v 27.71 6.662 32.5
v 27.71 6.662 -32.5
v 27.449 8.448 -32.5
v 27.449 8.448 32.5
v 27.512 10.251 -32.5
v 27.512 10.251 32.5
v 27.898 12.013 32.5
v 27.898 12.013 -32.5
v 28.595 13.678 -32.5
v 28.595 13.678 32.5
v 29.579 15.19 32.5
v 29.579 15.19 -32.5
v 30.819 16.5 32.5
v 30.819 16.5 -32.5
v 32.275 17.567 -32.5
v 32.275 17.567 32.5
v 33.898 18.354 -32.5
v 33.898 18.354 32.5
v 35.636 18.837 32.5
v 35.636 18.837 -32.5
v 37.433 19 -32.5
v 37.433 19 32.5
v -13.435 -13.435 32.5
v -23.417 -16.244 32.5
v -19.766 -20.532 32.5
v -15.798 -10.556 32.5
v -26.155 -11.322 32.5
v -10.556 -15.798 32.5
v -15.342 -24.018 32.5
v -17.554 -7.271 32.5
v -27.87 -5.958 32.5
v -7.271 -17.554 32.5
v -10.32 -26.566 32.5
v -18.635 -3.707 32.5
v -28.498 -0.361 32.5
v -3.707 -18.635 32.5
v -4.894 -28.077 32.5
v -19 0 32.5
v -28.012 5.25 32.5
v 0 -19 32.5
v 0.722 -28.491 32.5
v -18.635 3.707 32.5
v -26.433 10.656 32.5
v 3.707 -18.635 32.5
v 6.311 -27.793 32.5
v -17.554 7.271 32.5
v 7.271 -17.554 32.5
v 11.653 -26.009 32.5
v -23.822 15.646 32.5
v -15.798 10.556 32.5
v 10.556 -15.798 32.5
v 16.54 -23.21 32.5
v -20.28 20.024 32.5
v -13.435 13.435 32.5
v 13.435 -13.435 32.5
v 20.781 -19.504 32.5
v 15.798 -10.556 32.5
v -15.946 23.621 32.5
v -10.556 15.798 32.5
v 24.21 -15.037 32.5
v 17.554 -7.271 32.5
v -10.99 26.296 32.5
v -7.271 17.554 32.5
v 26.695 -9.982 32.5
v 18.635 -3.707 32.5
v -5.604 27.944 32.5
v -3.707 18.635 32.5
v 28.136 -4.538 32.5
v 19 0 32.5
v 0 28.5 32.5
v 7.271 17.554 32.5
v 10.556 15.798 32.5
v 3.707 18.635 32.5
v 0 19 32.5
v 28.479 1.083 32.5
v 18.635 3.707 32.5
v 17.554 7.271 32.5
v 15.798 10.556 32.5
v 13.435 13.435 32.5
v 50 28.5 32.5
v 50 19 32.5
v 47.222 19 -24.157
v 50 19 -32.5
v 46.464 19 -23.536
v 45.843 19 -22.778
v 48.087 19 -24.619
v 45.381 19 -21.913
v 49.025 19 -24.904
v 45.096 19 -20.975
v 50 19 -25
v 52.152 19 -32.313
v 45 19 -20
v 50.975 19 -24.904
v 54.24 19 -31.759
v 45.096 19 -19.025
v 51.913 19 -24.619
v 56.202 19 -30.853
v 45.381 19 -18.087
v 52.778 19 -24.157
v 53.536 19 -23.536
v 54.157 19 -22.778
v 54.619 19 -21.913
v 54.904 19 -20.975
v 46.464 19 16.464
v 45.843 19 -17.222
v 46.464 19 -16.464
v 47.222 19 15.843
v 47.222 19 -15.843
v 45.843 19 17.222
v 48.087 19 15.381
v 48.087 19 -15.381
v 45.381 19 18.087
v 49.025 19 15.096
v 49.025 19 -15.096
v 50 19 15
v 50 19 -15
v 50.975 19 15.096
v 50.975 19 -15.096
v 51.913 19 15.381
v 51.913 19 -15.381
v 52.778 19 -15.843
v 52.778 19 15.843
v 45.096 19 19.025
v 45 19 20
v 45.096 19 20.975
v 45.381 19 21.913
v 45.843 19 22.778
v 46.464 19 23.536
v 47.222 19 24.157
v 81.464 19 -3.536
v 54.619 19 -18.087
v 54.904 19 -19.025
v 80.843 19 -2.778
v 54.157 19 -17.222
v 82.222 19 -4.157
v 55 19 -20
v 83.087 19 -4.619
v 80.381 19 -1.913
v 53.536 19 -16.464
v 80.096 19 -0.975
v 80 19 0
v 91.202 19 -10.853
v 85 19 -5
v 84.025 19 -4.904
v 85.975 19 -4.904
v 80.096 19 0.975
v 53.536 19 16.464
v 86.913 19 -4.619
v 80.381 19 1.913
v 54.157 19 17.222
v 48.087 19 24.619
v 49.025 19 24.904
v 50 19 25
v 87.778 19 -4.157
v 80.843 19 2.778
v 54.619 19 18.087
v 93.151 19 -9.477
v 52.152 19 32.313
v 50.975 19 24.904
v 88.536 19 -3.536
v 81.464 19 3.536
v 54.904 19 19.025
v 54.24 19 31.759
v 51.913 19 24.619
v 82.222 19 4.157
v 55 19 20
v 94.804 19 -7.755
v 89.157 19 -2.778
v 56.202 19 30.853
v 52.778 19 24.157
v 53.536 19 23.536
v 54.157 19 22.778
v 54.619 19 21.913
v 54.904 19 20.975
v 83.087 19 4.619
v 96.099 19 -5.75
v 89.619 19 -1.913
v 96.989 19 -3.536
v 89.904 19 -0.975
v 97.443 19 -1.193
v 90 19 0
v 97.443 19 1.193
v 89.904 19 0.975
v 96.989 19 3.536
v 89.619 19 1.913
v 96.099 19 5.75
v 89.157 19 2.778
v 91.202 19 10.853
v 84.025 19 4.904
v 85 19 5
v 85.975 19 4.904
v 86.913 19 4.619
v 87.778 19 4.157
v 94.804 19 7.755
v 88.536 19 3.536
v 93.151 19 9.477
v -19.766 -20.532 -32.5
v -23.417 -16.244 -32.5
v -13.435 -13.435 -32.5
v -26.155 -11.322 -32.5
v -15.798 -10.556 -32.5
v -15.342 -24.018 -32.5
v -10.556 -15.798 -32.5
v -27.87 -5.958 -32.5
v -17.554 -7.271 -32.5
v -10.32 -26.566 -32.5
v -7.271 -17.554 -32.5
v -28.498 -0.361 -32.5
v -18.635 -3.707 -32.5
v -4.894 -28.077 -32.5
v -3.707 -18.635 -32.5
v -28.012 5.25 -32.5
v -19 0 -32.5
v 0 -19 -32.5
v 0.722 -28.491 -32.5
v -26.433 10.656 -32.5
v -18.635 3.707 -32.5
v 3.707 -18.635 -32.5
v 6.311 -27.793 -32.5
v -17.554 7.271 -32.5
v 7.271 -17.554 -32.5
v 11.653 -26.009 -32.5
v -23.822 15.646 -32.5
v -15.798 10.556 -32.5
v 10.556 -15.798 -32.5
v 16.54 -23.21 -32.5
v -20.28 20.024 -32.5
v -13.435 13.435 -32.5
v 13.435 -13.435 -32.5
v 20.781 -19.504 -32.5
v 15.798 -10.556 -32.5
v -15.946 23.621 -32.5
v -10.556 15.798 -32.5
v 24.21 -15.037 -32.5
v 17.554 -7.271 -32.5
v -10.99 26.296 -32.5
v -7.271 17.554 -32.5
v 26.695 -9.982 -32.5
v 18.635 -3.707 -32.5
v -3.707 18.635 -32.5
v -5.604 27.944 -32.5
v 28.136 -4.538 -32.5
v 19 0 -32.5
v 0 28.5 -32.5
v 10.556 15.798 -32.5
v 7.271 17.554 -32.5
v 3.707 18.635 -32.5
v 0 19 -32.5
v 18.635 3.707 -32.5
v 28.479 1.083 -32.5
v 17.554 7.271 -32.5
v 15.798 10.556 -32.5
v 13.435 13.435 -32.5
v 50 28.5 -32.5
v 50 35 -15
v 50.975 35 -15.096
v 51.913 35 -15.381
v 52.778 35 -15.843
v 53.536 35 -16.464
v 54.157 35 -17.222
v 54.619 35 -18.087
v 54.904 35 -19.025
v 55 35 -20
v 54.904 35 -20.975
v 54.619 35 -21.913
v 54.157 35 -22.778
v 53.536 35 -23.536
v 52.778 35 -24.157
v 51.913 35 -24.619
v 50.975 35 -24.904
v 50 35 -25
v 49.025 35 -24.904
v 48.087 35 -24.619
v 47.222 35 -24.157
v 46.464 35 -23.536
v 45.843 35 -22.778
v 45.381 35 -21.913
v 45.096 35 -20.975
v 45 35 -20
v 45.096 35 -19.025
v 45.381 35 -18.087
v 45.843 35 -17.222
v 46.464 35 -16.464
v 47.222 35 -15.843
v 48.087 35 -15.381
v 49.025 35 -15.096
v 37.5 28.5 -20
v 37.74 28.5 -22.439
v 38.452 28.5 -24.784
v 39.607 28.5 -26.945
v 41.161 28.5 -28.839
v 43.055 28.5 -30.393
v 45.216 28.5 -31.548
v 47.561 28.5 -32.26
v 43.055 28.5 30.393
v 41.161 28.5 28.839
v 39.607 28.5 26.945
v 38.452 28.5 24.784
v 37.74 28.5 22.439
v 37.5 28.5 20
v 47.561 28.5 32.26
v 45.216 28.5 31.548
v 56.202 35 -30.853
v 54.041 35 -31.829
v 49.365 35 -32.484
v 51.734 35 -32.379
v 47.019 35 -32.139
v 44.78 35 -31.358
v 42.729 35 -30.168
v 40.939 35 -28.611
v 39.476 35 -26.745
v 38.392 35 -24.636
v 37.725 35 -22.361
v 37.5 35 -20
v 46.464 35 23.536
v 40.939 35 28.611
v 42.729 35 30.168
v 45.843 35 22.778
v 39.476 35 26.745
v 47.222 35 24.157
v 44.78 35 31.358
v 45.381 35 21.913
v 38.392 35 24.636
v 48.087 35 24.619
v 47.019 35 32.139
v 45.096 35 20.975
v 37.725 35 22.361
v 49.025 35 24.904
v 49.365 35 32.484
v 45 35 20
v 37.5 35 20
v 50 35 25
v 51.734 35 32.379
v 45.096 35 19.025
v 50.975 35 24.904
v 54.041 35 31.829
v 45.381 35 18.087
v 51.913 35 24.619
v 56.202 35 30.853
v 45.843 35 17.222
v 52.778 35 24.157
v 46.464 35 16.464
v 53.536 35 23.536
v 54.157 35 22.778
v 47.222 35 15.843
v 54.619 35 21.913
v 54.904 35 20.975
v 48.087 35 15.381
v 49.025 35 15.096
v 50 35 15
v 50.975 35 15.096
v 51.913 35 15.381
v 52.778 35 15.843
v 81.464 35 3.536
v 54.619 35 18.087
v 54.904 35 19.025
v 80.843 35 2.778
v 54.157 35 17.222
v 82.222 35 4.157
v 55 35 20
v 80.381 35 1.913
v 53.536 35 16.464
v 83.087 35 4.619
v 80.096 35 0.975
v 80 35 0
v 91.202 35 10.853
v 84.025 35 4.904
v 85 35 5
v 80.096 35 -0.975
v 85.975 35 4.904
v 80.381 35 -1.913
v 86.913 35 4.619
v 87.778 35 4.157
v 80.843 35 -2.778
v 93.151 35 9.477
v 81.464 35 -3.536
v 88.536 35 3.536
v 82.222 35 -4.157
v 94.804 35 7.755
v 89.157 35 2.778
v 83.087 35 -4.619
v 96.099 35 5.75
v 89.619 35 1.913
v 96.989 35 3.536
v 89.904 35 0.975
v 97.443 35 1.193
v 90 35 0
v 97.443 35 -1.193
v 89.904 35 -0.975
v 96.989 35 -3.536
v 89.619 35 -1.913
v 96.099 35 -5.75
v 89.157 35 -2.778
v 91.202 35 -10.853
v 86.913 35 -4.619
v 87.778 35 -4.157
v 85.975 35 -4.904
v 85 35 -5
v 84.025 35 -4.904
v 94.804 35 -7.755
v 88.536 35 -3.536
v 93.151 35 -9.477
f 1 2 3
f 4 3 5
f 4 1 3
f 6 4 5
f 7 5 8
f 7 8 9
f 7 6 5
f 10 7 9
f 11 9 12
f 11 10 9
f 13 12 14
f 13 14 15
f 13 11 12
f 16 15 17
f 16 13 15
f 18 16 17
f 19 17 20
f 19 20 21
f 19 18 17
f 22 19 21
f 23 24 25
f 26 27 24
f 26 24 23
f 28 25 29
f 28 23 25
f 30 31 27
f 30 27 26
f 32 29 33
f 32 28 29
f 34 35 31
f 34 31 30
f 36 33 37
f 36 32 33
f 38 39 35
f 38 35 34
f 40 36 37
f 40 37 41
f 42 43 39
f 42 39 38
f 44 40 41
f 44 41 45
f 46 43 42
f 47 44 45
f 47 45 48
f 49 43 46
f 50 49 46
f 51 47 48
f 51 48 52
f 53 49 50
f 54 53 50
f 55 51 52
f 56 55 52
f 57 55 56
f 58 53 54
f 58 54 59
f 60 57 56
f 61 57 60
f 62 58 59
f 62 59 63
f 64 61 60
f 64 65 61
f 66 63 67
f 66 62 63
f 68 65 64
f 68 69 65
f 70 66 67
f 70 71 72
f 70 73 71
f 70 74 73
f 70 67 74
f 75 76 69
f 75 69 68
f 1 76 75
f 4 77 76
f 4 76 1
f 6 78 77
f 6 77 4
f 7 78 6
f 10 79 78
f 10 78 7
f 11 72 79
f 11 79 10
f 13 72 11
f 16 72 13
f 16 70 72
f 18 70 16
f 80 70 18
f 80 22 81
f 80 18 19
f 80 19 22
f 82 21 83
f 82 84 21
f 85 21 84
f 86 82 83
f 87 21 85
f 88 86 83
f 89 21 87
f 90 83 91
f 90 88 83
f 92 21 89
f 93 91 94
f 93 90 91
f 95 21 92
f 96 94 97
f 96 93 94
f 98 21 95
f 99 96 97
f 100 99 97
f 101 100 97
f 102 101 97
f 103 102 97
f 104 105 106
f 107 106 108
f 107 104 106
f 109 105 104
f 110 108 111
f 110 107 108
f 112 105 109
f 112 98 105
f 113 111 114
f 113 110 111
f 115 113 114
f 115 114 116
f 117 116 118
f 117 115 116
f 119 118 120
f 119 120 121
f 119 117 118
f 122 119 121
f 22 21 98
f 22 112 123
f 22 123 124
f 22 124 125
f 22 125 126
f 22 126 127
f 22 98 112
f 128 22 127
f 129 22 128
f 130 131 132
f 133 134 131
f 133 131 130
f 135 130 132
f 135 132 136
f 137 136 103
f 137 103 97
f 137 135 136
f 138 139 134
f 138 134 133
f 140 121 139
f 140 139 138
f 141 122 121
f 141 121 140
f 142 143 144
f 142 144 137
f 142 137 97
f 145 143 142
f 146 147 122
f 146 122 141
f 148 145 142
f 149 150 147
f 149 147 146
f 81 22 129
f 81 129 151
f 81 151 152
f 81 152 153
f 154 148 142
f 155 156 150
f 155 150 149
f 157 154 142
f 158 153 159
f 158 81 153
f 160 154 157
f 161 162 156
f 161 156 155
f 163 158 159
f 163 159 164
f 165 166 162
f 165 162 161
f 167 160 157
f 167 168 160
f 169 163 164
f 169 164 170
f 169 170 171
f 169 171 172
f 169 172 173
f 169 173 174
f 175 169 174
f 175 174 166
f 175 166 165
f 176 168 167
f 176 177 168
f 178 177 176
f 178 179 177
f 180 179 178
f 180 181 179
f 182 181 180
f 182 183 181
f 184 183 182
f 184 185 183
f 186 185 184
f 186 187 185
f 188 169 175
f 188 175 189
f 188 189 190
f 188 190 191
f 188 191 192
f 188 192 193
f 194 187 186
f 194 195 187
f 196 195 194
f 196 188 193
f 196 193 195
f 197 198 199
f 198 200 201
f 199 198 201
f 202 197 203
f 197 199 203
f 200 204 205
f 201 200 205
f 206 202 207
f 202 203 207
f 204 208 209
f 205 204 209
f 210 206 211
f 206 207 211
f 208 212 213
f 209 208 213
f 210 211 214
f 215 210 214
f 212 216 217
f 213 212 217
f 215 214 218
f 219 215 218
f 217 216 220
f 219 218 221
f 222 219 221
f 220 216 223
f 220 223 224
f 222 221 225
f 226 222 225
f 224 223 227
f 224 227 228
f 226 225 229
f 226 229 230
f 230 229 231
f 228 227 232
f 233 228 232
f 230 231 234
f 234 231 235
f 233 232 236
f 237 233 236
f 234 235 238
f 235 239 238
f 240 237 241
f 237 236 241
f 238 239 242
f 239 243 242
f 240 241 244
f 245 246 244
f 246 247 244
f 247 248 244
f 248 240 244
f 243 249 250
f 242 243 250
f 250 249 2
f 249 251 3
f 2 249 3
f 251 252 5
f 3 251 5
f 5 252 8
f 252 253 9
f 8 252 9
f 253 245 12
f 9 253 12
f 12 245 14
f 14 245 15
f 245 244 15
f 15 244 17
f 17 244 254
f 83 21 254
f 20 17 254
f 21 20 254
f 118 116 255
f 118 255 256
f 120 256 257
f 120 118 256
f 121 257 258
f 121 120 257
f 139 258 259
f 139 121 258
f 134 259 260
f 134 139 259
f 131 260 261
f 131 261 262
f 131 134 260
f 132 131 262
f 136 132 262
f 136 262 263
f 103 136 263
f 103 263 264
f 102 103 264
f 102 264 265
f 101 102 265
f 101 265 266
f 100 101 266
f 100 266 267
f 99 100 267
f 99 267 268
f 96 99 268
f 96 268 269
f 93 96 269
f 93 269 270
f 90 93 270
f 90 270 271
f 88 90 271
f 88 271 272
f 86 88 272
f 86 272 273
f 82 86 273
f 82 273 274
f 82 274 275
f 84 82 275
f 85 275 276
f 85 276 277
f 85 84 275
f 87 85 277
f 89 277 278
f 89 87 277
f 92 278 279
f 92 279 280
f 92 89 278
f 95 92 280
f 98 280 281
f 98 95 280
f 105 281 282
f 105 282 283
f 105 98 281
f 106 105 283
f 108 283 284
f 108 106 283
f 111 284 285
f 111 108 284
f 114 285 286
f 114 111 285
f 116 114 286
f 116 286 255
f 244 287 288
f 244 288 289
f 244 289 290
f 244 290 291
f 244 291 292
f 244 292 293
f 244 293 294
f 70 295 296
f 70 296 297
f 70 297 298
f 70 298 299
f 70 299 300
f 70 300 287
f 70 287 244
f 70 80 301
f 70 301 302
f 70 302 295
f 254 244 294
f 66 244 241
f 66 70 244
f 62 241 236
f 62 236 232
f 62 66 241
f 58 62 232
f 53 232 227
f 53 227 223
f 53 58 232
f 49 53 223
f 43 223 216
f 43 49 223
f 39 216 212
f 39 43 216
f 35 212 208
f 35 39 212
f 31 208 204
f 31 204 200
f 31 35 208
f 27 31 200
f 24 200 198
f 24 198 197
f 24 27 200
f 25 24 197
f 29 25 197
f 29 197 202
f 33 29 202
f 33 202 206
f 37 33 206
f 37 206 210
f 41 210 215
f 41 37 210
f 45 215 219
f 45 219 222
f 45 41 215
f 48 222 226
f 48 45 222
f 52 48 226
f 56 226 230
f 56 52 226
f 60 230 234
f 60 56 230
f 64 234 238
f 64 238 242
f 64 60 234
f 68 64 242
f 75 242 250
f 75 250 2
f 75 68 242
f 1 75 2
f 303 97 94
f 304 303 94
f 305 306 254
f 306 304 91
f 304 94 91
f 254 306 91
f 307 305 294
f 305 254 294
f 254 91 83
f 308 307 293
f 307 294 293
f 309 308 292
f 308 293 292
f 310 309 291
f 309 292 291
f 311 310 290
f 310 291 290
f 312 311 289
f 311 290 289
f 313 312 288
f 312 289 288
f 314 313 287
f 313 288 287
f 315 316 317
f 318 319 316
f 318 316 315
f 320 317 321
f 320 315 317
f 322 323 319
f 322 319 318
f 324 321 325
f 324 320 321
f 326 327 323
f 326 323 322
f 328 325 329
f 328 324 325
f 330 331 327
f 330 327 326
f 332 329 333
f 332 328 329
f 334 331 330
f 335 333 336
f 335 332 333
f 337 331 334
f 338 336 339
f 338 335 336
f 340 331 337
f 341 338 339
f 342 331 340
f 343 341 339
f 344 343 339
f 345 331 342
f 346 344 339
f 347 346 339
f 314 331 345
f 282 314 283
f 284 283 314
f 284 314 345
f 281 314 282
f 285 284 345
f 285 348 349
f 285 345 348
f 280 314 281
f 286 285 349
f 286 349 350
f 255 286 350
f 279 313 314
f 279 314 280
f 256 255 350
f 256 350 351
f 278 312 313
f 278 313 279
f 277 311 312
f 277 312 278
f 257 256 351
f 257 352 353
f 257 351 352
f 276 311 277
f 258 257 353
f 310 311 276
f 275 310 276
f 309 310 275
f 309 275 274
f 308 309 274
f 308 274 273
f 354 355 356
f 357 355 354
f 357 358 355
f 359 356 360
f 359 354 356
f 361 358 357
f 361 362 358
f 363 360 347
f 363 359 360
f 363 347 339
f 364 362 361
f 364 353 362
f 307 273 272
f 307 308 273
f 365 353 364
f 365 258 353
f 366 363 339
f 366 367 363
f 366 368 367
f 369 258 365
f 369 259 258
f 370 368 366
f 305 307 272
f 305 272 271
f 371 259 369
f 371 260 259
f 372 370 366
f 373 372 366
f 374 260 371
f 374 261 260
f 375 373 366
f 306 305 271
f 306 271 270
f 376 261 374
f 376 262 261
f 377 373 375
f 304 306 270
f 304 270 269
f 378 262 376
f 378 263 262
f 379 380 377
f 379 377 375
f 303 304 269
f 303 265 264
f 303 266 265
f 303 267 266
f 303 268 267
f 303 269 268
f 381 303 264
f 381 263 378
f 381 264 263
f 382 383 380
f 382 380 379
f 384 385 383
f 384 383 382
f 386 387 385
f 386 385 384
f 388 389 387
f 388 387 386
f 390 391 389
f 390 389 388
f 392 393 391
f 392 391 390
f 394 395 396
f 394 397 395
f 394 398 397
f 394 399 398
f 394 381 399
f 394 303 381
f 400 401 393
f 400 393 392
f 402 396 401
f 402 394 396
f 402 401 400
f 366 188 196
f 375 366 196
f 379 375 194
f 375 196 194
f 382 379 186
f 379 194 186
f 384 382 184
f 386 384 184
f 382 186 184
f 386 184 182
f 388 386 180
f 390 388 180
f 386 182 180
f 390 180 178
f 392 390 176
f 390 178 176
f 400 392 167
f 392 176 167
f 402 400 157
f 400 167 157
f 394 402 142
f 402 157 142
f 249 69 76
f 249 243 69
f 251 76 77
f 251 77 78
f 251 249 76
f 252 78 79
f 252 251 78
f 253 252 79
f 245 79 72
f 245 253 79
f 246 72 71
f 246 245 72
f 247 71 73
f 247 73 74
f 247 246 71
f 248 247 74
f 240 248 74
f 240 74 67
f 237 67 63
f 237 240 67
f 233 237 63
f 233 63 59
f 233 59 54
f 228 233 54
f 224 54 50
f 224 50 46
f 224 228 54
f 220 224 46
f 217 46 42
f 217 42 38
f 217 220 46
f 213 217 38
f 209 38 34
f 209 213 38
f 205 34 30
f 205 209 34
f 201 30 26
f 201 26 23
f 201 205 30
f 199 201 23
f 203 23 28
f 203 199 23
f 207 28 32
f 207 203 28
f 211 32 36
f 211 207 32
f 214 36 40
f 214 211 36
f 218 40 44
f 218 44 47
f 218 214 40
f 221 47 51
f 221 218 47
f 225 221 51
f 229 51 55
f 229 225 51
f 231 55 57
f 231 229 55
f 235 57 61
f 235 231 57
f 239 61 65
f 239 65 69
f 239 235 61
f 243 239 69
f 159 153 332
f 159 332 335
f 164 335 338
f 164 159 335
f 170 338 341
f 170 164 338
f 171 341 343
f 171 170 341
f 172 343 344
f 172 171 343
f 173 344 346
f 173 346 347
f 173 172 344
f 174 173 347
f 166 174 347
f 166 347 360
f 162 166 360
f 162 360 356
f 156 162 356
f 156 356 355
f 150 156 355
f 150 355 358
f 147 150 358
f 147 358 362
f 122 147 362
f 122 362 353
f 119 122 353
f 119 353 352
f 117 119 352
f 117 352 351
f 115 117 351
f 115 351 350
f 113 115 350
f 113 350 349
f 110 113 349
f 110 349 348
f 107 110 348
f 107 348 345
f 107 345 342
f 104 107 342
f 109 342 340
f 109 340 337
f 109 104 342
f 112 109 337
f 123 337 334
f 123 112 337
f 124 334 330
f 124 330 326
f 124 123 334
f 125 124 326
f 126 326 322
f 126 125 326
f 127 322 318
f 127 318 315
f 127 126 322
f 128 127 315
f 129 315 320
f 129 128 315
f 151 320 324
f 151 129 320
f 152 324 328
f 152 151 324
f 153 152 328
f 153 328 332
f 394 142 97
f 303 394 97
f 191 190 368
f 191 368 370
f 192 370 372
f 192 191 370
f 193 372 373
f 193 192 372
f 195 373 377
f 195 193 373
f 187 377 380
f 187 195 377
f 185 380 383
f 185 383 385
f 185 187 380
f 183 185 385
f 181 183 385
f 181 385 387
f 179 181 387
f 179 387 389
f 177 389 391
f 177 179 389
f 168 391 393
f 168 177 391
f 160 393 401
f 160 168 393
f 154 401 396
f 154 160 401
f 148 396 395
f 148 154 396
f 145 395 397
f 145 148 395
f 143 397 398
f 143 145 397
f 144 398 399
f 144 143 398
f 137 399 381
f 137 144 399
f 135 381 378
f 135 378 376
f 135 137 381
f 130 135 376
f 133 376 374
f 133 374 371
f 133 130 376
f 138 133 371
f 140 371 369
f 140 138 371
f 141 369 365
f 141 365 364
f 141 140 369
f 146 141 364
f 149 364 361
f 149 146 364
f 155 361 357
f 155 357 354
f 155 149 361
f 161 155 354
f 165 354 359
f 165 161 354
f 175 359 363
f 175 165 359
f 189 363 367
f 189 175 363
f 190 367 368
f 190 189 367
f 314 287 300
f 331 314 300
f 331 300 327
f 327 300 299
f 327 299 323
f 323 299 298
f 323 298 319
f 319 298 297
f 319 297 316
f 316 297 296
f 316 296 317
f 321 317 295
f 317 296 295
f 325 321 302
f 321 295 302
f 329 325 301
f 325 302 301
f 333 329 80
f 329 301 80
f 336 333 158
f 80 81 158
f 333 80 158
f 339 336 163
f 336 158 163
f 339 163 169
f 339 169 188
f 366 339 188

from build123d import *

# Parameters (mm, degrees)
SKETCH1_R           = 19
BOSS_EXTRUDE1_DEPTH = 32.5
BOSS_EXTRUDE2_START = -9.5
SKETCH2_R           = 5
BOSS_EXTRUDE2_DEPTH = 16
CUT_EXTRUDE2_START  = -16
SKETCH4_R           = 5
CUT_EXTRUDE2_DEPTH  = 16


with BuildPart() as part:
    # Sketch1 → Boss-Extrude1 (new, symmetric)
    with BuildSketch(Plane.XY):
        with BuildLine():
            Line((37.433273968, 19), (50, 19))
            Line((50, 19), (50, 28.5))
            Line((50, 28.5), (0, 28.5))
            ThreePointArc((0, 28.5), (-17.640484356, -22.38444352), (27.710345665, 6.662337662))
            ThreePointArc((27.710345665, 6.662337662), (29.57908326, 15.189643634), (37.433273968, 19))
        make_face()
        Circle(SKETCH1_R, mode=Mode.SUBTRACT)
    extrude(amount=BOSS_EXTRUDE1_DEPTH, both=True)

    # Sketch2 → Boss-Extrude2 (add)
    with BuildSketch(Plane(origin=(0, 28.5, 0), x_dir=(1, 0, 0), z_dir=(0, 1, 0)).offset(BOSS_EXTRUDE2_START)):
        with BuildLine():
            Line((37.5, 20), (37.5, -20))
            ThreePointArc((37.5, -20), (43.725914773, -30.811376164), (56.201736729, -30.853039277))
            Line((56.201736729, -30.853039277), (91.201736729, -10.853039277))
            ThreePointArc((91.201736729, -10.853039277), (97.5, 0), (91.201736729, 10.853039277))
            Line((91.201736729, 10.853039277), (56.201736729, 30.853039277))
            ThreePointArc((56.201736729, 30.853039277), (43.725914773, 30.811376164), (37.5, 20))
        make_face()
        with Locations(Location((50, 20, 0), (0, 0, 270))):
            Circle(SKETCH2_R, mode=Mode.SUBTRACT)
        with Locations(Location((50, -20, 0), (0, 0, 270))):
            Circle(SKETCH2_R, mode=Mode.SUBTRACT)
        with Locations(Location((85, 0, 0), (0, 0, 270))):
            Circle(SKETCH2_R, mode=Mode.SUBTRACT)
    extrude(amount=BOSS_EXTRUDE2_DEPTH)

    # Sketch4 → Cut-Extrude2 (cut)
    with BuildSketch(Plane(origin=(0, 35, 0), x_dir=(1, 0, 0), z_dir=(0, 1, 0)).offset(CUT_EXTRUDE2_START)):
        with Locations(Location((50, -20, 0), (0, 0, 270))):
            Circle(SKETCH4_R)
        with Locations(Location((85, 0, 0), (0, 0, 270))):
            Circle(SKETCH4_R)
        with Locations(Location((50, 20, 0), (0, 0, 270))):
            Circle(SKETCH4_R)
    extrude(amount=CUT_EXTRUDE2_DEPTH, mode=Mode.SUBTRACT)


solid = part.part
